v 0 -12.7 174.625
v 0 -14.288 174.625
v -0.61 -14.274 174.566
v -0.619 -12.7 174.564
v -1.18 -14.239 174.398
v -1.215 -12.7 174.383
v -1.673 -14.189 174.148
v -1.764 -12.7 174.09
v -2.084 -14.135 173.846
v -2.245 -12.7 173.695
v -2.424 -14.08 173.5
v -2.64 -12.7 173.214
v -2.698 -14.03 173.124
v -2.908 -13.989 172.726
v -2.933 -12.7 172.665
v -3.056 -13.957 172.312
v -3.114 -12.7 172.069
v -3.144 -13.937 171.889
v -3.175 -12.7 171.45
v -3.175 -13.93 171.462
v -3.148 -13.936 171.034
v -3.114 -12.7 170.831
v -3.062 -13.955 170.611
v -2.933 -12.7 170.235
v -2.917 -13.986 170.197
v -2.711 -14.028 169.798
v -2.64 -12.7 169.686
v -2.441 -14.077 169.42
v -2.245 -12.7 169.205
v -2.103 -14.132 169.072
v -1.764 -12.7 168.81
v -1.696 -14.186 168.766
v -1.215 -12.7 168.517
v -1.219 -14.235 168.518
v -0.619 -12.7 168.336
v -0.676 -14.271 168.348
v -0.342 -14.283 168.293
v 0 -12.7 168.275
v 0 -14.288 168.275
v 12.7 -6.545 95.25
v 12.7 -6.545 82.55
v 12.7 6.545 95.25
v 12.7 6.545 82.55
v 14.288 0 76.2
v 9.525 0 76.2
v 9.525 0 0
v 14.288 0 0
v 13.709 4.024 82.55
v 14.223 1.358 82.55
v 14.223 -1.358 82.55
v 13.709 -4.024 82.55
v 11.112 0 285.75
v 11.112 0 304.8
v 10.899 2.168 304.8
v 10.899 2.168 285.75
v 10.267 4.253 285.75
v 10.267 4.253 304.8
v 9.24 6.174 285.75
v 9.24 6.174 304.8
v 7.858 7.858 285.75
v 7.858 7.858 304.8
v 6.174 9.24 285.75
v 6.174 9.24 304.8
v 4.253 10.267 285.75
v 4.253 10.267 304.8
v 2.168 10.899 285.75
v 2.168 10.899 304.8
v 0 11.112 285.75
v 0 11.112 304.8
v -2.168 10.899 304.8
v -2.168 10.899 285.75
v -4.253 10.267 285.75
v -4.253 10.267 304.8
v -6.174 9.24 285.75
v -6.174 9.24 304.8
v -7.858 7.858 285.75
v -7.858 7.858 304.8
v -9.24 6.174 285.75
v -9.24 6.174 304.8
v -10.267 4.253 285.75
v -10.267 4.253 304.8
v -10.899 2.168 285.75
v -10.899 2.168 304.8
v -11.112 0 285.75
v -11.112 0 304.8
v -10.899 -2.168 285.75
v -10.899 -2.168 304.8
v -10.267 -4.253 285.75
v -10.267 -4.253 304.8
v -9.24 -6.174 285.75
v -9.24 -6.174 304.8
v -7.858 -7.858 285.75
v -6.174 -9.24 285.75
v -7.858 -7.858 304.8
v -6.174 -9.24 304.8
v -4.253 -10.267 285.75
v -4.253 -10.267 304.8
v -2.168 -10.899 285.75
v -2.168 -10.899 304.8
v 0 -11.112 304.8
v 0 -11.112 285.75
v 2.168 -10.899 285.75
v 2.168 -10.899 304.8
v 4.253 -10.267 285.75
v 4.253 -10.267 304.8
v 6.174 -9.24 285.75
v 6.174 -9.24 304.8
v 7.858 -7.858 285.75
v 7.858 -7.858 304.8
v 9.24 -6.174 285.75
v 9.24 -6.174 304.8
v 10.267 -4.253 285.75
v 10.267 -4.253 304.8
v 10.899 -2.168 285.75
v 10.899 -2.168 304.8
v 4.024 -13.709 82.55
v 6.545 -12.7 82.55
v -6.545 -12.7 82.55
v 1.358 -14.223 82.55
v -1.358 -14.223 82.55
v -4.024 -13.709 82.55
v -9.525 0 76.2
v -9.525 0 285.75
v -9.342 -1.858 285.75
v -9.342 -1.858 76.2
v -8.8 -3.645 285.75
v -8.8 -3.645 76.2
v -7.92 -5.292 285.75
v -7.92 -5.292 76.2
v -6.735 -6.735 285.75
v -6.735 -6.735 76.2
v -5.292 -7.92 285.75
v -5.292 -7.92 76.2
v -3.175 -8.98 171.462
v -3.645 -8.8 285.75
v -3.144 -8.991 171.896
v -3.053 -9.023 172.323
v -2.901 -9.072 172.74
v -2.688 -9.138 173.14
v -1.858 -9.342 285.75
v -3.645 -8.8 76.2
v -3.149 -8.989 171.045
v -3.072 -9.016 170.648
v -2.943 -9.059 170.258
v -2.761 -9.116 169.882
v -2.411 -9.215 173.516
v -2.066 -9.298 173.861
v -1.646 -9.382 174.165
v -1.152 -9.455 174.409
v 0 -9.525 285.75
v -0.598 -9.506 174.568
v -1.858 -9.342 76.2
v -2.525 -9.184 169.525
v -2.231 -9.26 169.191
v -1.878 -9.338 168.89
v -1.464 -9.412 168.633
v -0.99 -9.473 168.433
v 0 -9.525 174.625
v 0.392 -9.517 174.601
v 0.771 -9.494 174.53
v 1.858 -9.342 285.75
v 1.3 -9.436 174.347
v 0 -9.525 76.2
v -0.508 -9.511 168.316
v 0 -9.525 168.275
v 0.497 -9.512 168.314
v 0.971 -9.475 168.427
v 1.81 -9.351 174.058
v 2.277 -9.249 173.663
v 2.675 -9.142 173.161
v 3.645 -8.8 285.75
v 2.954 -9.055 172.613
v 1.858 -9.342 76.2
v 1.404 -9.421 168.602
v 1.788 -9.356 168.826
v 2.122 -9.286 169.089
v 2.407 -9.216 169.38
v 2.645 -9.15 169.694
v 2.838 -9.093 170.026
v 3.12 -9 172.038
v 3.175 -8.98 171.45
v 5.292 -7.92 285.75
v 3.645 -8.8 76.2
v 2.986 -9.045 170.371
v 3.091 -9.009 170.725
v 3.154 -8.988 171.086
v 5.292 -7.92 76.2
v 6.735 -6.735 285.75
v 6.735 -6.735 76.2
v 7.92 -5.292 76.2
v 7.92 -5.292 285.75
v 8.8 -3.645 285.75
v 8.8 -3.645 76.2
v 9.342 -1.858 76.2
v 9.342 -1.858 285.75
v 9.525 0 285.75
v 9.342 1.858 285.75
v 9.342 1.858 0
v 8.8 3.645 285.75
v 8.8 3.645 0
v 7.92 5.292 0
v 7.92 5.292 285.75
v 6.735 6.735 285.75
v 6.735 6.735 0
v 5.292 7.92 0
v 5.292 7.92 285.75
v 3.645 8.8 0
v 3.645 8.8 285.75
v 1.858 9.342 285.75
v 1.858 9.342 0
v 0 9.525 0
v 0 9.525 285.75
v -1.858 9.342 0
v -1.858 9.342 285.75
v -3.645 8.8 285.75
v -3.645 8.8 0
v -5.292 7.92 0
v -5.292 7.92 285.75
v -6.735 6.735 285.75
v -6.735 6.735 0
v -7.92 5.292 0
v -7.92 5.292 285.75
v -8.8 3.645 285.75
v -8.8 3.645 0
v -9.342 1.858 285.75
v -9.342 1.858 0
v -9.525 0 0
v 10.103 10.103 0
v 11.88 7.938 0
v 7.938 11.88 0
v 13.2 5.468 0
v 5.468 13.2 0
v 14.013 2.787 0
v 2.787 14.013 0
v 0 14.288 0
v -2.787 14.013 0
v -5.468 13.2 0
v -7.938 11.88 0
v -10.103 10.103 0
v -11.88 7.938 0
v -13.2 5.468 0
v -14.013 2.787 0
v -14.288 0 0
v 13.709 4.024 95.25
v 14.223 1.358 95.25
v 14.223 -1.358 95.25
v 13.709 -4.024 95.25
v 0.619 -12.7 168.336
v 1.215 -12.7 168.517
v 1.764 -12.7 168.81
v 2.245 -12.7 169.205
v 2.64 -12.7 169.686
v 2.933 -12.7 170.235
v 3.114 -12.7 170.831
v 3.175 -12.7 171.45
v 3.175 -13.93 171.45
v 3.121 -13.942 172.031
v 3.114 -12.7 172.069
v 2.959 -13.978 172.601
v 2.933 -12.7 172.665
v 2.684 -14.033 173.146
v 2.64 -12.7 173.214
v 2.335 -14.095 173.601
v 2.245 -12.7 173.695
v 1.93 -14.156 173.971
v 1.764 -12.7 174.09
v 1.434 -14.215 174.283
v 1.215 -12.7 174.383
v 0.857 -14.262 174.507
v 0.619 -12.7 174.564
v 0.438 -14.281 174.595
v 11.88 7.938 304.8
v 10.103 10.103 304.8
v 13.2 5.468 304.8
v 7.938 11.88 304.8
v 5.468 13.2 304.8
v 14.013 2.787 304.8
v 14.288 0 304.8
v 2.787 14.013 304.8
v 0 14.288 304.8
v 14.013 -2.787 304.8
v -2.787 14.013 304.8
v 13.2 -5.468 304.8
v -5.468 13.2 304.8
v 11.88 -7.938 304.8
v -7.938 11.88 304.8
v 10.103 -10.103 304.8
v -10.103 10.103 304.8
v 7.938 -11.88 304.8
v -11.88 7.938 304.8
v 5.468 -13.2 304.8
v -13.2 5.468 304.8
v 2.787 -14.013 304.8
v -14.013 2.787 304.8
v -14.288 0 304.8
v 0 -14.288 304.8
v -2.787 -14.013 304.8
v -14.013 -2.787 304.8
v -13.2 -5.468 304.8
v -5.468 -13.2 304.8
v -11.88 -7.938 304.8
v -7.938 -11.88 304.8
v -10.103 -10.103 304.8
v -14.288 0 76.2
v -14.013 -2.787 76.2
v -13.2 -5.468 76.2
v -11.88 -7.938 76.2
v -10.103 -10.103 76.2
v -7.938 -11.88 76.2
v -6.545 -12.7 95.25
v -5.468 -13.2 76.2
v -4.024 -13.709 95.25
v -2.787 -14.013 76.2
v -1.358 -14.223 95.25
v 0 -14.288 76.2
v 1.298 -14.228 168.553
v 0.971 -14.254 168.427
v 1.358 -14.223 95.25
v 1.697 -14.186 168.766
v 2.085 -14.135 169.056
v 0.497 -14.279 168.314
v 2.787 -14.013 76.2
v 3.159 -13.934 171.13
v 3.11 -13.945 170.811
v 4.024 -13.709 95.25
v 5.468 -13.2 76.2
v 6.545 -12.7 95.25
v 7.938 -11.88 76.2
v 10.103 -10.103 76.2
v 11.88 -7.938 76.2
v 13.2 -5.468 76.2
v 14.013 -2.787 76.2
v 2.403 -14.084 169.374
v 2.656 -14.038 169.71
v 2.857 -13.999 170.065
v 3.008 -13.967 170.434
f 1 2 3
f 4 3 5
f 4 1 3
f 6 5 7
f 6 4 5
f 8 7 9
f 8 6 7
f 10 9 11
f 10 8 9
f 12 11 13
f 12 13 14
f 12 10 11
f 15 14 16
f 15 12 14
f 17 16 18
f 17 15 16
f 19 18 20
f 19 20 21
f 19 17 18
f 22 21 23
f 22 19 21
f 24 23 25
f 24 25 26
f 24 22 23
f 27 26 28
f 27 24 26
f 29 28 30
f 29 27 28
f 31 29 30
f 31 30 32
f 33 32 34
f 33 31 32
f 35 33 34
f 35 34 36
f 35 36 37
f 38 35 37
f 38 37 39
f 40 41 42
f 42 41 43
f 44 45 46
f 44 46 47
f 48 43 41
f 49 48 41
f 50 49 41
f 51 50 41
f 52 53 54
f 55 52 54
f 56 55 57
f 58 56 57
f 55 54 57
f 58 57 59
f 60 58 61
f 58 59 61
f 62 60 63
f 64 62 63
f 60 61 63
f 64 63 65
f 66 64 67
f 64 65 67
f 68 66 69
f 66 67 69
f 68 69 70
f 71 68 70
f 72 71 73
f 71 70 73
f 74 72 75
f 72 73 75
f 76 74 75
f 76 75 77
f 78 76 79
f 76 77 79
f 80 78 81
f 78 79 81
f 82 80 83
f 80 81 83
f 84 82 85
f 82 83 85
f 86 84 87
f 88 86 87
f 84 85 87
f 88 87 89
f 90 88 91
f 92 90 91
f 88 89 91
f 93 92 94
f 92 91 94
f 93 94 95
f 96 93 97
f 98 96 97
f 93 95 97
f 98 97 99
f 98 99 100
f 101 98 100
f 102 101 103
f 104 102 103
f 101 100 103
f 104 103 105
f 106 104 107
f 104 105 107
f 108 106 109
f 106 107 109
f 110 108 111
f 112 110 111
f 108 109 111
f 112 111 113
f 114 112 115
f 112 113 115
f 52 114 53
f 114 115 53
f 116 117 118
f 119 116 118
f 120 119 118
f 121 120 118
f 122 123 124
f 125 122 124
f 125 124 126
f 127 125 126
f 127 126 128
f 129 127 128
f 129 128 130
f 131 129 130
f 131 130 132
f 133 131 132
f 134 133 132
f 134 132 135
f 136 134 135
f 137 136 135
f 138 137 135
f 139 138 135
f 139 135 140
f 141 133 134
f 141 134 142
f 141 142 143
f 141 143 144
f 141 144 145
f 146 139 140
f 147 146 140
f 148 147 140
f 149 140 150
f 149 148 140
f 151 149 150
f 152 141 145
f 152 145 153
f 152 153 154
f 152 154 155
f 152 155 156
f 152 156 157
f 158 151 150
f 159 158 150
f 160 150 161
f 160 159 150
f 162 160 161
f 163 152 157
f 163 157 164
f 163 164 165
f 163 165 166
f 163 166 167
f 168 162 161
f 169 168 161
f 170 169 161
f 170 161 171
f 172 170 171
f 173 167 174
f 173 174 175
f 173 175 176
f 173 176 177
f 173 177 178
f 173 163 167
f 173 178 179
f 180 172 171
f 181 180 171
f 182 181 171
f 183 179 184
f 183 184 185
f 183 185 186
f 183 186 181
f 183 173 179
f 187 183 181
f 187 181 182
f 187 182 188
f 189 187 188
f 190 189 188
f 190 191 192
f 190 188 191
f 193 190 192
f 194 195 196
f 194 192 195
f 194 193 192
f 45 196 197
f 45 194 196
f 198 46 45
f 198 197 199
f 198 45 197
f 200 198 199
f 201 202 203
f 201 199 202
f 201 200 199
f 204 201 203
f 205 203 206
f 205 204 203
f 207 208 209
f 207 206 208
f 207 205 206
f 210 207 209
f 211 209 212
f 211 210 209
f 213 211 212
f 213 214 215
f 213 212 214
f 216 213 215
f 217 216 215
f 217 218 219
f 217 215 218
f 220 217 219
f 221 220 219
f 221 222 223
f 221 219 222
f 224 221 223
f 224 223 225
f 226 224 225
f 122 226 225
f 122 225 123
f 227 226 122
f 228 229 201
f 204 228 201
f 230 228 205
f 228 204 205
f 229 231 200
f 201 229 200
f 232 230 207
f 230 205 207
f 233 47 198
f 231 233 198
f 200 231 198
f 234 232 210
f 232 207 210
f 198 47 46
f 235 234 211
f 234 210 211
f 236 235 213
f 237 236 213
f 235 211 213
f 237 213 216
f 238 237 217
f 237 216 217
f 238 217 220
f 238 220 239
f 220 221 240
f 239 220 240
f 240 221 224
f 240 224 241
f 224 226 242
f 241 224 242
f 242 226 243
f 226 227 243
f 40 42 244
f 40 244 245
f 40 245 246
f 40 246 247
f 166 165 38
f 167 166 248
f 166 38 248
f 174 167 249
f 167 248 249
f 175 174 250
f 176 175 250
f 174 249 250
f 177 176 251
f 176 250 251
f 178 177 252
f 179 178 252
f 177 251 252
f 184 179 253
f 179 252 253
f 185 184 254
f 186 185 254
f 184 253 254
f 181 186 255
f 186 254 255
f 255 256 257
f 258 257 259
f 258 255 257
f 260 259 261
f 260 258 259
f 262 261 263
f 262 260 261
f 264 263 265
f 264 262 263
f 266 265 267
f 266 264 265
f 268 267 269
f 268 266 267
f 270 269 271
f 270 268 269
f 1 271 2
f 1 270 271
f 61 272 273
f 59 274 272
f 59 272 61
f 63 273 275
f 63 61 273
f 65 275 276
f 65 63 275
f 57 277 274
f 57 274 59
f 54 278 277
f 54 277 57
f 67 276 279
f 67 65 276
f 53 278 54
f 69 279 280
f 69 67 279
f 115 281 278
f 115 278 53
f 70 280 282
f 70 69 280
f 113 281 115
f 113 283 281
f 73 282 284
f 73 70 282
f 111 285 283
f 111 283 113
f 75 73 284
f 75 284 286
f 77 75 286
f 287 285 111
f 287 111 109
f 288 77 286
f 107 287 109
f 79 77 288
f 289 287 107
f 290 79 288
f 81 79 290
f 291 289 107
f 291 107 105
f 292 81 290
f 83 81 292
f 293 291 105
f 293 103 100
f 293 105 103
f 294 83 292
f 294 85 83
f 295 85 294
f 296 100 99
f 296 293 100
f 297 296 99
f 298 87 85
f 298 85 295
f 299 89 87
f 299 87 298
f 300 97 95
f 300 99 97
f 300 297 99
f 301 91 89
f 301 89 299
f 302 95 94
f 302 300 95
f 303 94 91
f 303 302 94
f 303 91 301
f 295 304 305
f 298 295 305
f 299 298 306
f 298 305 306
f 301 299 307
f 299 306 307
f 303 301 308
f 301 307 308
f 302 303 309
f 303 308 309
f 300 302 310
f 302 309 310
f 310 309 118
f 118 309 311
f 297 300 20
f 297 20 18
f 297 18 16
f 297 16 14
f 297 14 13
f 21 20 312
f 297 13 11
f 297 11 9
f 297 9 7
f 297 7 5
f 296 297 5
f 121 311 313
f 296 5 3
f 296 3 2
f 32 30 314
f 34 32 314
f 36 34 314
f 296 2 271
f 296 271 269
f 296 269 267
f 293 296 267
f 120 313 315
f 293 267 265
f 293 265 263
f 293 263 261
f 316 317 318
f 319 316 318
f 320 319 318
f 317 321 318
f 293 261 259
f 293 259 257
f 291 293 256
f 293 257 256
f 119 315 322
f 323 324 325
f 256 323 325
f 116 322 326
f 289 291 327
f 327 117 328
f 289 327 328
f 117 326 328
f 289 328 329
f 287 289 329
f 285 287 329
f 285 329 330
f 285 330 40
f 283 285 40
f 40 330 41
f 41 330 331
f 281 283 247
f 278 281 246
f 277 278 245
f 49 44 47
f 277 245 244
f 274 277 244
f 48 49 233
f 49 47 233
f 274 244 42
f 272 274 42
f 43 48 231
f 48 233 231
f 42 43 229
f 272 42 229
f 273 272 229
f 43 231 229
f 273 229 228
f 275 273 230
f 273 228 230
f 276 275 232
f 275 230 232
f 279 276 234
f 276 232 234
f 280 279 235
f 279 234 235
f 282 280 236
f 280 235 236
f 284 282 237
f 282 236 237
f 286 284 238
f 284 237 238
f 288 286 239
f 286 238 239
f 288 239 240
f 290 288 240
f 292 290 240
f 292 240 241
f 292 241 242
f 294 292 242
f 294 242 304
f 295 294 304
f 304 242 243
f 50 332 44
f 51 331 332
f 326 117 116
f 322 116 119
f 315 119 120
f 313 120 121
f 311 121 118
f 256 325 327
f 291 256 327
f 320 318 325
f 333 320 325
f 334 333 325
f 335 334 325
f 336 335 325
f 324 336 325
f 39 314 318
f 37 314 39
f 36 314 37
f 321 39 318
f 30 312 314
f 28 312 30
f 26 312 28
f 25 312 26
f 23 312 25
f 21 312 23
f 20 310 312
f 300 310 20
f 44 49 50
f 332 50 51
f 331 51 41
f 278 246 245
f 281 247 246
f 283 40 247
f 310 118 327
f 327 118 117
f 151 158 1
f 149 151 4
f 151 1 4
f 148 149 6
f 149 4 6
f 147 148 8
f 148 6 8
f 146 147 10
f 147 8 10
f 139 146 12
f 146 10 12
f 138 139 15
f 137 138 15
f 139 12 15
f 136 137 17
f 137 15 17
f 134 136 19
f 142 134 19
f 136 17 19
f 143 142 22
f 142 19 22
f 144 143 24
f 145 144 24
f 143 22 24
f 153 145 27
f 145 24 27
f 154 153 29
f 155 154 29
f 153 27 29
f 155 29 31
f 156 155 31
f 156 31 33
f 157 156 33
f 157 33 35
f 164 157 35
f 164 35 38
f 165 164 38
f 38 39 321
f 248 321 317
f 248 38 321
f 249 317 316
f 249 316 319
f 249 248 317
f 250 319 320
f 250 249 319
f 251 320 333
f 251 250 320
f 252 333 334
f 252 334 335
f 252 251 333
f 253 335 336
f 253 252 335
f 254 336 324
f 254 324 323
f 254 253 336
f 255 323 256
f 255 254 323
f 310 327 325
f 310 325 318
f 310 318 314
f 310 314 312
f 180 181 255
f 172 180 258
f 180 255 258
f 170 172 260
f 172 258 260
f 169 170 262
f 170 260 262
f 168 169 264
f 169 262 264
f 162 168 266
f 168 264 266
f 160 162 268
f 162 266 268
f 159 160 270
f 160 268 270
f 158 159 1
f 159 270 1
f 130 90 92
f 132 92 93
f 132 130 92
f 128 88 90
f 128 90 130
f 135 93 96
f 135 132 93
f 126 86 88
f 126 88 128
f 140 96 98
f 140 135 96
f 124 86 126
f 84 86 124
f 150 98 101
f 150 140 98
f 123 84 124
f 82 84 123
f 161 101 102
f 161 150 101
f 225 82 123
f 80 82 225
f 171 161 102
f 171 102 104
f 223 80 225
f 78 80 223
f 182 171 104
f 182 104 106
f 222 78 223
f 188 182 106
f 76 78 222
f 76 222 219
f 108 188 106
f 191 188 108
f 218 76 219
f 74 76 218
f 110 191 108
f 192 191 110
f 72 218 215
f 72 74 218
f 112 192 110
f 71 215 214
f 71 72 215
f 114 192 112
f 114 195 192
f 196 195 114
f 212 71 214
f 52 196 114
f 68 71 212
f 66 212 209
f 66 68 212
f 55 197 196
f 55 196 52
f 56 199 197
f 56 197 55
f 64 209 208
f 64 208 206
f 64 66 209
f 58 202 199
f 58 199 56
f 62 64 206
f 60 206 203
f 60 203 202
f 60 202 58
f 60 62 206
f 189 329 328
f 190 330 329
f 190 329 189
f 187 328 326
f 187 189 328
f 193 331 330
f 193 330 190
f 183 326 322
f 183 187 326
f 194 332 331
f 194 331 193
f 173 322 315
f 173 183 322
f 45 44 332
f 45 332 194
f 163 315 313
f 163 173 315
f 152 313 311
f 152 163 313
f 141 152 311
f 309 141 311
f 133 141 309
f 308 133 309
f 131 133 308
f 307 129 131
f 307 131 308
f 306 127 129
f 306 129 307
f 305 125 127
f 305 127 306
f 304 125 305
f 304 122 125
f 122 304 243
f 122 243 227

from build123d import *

# Parameters (mm, degrees)
SKETCH1_R                           = 14.2875
SKETCH1_R_2                         = 9.525
BOSS_EXTRUDE1_DEPTH                 = 304.8
SKETCH2_R                           = 11.1125
CUT_EXTRUDE1_DEPTH                  = 19.05
CUT_EXTRUDE4_DEPTH                  = 76.2
CUT_EXTRUDE7_DEPTH                  = 12.7
CUT_EXTRUDE8_REACH                  = 308.326
CUT_EXTRUDE8_END_RADIUS             = 9.525
CUT_EXTRUDE8_DIRECTION_2_REACH      = 308.326
CUT_EXTRUDE8_DIRECTION_2_END_RADIUS = 14.2875


with BuildPart() as part:
    # Sketch1 → Boss-Extrude1 (new body)
    with BuildSketch(Plane.XY):
        with Locations(Location((0, 0, 0), (0, 0, 180))):
            Circle(SKETCH1_R)
        with Locations(Location((0, 0, 0), (0, 0, 180))):
            Circle(SKETCH1_R_2, mode=Mode.SUBTRACT)
    extrude(amount=BOSS_EXTRUDE1_DEPTH)

    # Sketch2 → Cut-Extrude1 (cut)
    with BuildSketch(Plane.XY.offset(304.8)):
        Circle(SKETCH2_R)
    extrude(amount=-CUT_EXTRUDE1_DEPTH, mode=Mode.SUBTRACT)

    # Sketch6 → Cut-Extrude4 (cut)
    with BuildSketch(Plane(origin=(0, 0, 0), x_dir=(-1, 0, 0), z_dir=(0, 0, -1))):
        with BuildLine():
            Line((14.2875, 0), (-14.2875, 0))
            ThreePointArc((-14.2875, 0), (0, -14.2875), (14.2875, 0))
        make_face()
    extrude(amount=-CUT_EXTRUDE4_DEPTH, mode=Mode.SUBTRACT)

    # Sketch8 → Cut-Extrude7 (cut)
    with BuildSketch(Plane(origin=(0, 0, 82.55), x_dir=(-1, 0, 0), z_dir=(0, 0, -1))):
        with BuildLine():
            ThreePointArc((-6.545430181, -12.7), (0, -14.2875), (6.545430181, -12.7))
            Line((6.545430181, -12.7), (-6.545430181, -12.7))
        make_face()
        with BuildLine():
            Line((-12.7, -6.545430181), (-12.7, 6.545430181))
            ThreePointArc((-12.7, 6.545430181), (-14.2875, 0), (-12.7, -6.545430181))
        make_face()
    extrude(amount=-CUT_EXTRUDE7_DEPTH, mode=Mode.SUBTRACT)

    # Cut-Extrude8: up to this cylinder (the profile starts outside it)
    cut_extrude8_end = Plane(origin=(0, 0, 171.45), z_dir=(0, 0, -1)) * Cylinder(CUT_EXTRUDE8_END_RADIUS, 636.702, mode=Mode.PRIVATE)
    # Sketch9 → Cut-Extrude8 (cut, up to the surface)
    with BuildSketch(Plane.XZ.offset(12.7), mode=Mode.PRIVATE) as cut_extrude8_sk1:
        with BuildLine():
            ThreePointArc((0, 174.625), (-3.175, 171.45), (0, 168.275))
            Line((0, 168.275), (0, 174.625))
        make_face()
    cut_extrude8_tool1 = extrude(cut_extrude8_sk1.sketch, amount=-CUT_EXTRUDE8_REACH, mode=Mode.PRIVATE) - cut_extrude8_end
    add(cut_extrude8_tool1.solids().sort_by_distance((-1.347512, -12.7, 171.45))[0], mode=Mode.SUBTRACT)
    # Sketch9 → Cut-Extrude8 (cut, up to the surface)
    with BuildSketch(Plane.XZ.offset(12.7), mode=Mode.PRIVATE) as cut_extrude8_sk2:
        with BuildLine():
            Line((0, 174.625), (0, 168.275))
            ThreePointArc((0, 168.275), (2.24506403, 169.20493597), (3.175, 171.45))
            ThreePointArc((3.175, 171.45), (2.24506403, 173.69506403), (0, 174.625))
        make_face()
    cut_extrude8_tool2 = extrude(cut_extrude8_sk2.sketch, amount=-CUT_EXTRUDE8_REACH, mode=Mode.PRIVATE) - cut_extrude8_end
    add(cut_extrude8_tool2.solids().sort_by_distance((1.347512, -12.7, 171.45))[0], mode=Mode.SUBTRACT)
    # Sketch9 → Cut-Extrude8 (cut, up to the surface)
    with BuildSketch(Plane.XZ.offset(12.7), mode=Mode.PRIVATE) as cut_extrude8_sk3:
        with BuildLine():
            ThreePointArc((0, 174.625), (-3.175, 171.45), (0, 168.275))
            Line((0, 168.275), (0, 174.625))
        make_face()
    cut_extrude8_tool3 = extrude(cut_extrude8_sk3.sketch, amount=-CUT_EXTRUDE8_REACH, mode=Mode.PRIVATE) - cut_extrude8_end
    add(cut_extrude8_tool3.solids().sort_by_distance((-1.347512, -12.7, 171.45))[0], mode=Mode.SUBTRACT)
    # Sketch9 → Cut-Extrude8 (cut, up to the surface)
    with BuildSketch(Plane.XZ.offset(12.7), mode=Mode.PRIVATE) as cut_extrude8_sk4:
        with BuildLine():
            Line((0, 174.625), (0, 168.275))
            ThreePointArc((0, 168.275), (2.24506403, 169.20493597), (3.175, 171.45))
            ThreePointArc((3.175, 171.45), (2.24506403, 173.69506403), (0, 174.625))
        make_face()
    cut_extrude8_tool4 = extrude(cut_extrude8_sk4.sketch, amount=-CUT_EXTRUDE8_REACH, mode=Mode.PRIVATE) - cut_extrude8_end
    add(cut_extrude8_tool4.solids().sort_by_distance((1.347512, -12.7, 171.45))[0], mode=Mode.SUBTRACT)

    # Cut-Extrude8 direction 2: up to this cylinder (the profile starts inside it)
    cut_extrude8_direction_2_end = Plane(origin=(0, 0, 171.45), z_dir=(0, 0, -1)) * Cylinder(CUT_EXTRUDE8_DIRECTION_2_END_RADIUS, 646.227, mode=Mode.PRIVATE)
    # Sketch9 → Cut-Extrude8 direction 2 (cut, up to the surface)
    with BuildSketch(Plane.XZ.offset(12.7), mode=Mode.PRIVATE) as cut_extrude8_direction_2_sk1:
        with BuildLine():
            ThreePointArc((0, 174.625), (-3.175, 171.45), (0, 168.275))
            Line((0, 168.275), (0, 174.625))
        make_face()
    cut_extrude8_direction_2_tool1 = extrude(cut_extrude8_direction_2_sk1.sketch, amount=CUT_EXTRUDE8_DIRECTION_2_REACH, mode=Mode.PRIVATE) & cut_extrude8_direction_2_end
    add(cut_extrude8_direction_2_tool1.solids().sort_by_distance((-1.347512, -12.7, 171.45))[0], mode=Mode.SUBTRACT)
    # Sketch9 → Cut-Extrude8 direction 2 (cut, up to the surface)
    with BuildSketch(Plane.XZ.offset(12.7), mode=Mode.PRIVATE) as cut_extrude8_direction_2_sk2:
        with BuildLine():
            Line((0, 174.625), (0, 168.275))
            ThreePointArc((0, 168.275), (2.24506403, 169.20493597), (3.175, 171.45))
            ThreePointArc((3.175, 171.45), (2.24506403, 173.69506403), (0, 174.625))
        make_face()
    cut_extrude8_direction_2_tool2 = extrude(cut_extrude8_direction_2_sk2.sketch, amount=CUT_EXTRUDE8_DIRECTION_2_REACH, mode=Mode.PRIVATE) & cut_extrude8_direction_2_end
    add(cut_extrude8_direction_2_tool2.solids().sort_by_distance((1.347512, -12.7, 171.45))[0], mode=Mode.SUBTRACT)
    # Sketch9 → Cut-Extrude8 direction 2 (cut, up to the surface)
    with BuildSketch(Plane.XZ.offset(12.7), mode=Mode.PRIVATE) as cut_extrude8_direction_2_sk3:
        with BuildLine():
            ThreePointArc((0, 174.625), (-3.175, 171.45), (0, 168.275))
            Line((0, 168.275), (0, 174.625))
        make_face()
    cut_extrude8_direction_2_tool3 = extrude(cut_extrude8_direction_2_sk3.sketch, amount=CUT_EXTRUDE8_DIRECTION_2_REACH, mode=Mode.PRIVATE) & cut_extrude8_direction_2_end
    add(cut_extrude8_direction_2_tool3.solids().sort_by_distance((-1.347512, -12.7, 171.45))[0], mode=Mode.SUBTRACT)
    # Sketch9 → Cut-Extrude8 direction 2 (cut, up to the surface)
    with BuildSketch(Plane.XZ.offset(12.7), mode=Mode.PRIVATE) as cut_extrude8_direction_2_sk4:
        with BuildLine():
            Line((0, 174.625), (0, 168.275))
            ThreePointArc((0, 168.275), (2.24506403, 169.20493597), (3.175, 171.45))
            ThreePointArc((3.175, 171.45), (2.24506403, 173.69506403), (0, 174.625))
        make_face()
    cut_extrude8_direction_2_tool4 = extrude(cut_extrude8_direction_2_sk4.sketch, amount=CUT_EXTRUDE8_DIRECTION_2_REACH, mode=Mode.PRIVATE) & cut_extrude8_direction_2_end
    add(cut_extrude8_direction_2_tool4.solids().sort_by_distance((1.347512, -12.7, 171.45))[0], mode=Mode.SUBTRACT)


solid = part.part
